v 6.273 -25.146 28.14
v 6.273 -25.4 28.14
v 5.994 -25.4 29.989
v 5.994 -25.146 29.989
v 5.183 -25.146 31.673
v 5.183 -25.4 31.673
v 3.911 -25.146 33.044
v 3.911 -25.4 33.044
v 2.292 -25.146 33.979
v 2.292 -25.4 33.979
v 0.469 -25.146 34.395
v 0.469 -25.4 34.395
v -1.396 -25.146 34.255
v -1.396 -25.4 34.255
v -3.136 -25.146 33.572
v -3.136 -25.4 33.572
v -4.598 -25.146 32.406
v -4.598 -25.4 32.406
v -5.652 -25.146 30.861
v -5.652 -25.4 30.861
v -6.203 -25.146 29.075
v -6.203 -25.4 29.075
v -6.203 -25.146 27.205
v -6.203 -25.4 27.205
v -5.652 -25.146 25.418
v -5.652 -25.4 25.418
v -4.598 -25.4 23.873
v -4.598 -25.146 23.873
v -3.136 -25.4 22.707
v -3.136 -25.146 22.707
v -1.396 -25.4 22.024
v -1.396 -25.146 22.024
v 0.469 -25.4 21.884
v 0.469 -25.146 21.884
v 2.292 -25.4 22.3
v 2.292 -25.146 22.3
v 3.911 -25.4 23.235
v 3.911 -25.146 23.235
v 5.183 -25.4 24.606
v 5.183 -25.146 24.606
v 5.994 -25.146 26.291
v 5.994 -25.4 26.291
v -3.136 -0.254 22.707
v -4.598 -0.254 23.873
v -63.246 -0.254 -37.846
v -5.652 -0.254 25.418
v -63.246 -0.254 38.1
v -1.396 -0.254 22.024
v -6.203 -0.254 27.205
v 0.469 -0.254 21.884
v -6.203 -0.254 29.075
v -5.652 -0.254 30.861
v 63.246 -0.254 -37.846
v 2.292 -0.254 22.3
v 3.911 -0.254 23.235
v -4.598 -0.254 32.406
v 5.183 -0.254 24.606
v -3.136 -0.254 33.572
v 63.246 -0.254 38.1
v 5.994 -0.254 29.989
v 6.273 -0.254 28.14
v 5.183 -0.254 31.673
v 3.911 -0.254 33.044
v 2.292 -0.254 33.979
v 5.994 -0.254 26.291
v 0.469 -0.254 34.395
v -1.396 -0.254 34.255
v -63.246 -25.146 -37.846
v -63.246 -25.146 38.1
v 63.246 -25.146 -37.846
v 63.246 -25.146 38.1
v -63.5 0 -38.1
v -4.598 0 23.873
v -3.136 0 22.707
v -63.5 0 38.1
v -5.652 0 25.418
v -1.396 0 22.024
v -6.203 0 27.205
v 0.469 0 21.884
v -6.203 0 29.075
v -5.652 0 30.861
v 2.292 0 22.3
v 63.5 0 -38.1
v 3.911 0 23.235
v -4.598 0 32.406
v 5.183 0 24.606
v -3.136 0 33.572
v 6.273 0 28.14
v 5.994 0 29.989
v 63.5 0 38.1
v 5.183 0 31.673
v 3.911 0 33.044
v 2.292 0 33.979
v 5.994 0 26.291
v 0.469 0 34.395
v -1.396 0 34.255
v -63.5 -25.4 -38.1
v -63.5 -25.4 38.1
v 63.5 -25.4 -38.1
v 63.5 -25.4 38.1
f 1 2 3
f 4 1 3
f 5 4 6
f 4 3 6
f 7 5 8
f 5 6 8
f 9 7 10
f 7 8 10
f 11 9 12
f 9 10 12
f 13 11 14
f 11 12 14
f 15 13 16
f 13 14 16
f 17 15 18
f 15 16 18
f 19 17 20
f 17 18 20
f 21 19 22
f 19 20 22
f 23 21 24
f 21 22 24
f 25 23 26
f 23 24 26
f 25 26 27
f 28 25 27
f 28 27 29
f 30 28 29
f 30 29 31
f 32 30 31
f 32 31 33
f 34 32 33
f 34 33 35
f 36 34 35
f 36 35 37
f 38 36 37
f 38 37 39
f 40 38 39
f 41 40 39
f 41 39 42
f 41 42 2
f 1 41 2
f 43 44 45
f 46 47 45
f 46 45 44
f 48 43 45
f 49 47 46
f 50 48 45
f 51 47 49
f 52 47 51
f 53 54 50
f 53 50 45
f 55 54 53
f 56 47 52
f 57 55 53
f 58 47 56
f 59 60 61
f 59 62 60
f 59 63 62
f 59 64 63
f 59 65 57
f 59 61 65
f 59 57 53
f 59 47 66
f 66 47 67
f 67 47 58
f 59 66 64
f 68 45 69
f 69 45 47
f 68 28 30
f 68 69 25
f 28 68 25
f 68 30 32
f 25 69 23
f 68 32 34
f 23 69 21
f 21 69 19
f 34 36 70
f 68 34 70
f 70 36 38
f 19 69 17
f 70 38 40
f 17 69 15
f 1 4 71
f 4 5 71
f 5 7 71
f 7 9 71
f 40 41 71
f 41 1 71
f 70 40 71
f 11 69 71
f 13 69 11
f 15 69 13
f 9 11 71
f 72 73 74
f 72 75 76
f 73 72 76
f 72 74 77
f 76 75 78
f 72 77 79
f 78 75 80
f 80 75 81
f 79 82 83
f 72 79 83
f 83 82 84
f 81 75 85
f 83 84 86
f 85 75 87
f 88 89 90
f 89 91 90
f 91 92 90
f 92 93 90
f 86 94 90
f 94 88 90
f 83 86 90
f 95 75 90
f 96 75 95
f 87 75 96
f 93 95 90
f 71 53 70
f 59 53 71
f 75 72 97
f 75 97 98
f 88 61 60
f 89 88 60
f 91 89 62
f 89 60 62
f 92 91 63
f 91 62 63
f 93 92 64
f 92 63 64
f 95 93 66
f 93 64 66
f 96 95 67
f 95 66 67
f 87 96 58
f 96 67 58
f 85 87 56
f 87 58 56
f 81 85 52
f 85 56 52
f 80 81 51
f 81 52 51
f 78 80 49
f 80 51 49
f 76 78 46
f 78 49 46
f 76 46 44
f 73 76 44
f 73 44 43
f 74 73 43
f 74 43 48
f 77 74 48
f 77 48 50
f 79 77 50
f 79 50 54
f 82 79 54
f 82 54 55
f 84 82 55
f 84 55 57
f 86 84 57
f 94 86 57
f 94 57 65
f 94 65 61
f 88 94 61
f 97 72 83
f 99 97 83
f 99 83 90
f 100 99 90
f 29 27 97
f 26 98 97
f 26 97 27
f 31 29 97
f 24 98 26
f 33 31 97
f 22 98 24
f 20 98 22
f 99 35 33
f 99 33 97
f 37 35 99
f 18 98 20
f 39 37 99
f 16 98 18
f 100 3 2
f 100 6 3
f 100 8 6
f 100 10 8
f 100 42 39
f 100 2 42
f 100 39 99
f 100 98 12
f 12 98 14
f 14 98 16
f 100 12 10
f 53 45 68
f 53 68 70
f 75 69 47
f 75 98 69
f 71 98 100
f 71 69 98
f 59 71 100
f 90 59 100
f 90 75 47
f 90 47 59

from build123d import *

# Parameters (mm, degrees)
F0_W     = 127
F0_H     = 76.2
F1_DEPTH = 25.4
F2_T     = -0.254
F3_R     = 6.272881
F4_DEPTH = 50.8


with BuildPart() as f1:
    # F0 (on Front) → F1 (new body)
    with BuildSketch(Plane.XZ):
        Rectangle(F0_W, F0_H)
    extrude(amount=F1_DEPTH)

    # F2
    f2_openings = [f1.faces().sort_by_distance(p)[0] for p in [
        (0, -12.7, 38.1),
    ]]
    offset(amount=F2_T, openings=f2_openings)

    # F3 (on face) → F4 (cut)
    with BuildSketch(Plane.XZ.offset(25.4)):
        with Locations((0, 28.13966)):
            Circle(F3_R)
    extrude(amount=-F4_DEPTH, mode=Mode.SUBTRACT)


solid = f1.part
